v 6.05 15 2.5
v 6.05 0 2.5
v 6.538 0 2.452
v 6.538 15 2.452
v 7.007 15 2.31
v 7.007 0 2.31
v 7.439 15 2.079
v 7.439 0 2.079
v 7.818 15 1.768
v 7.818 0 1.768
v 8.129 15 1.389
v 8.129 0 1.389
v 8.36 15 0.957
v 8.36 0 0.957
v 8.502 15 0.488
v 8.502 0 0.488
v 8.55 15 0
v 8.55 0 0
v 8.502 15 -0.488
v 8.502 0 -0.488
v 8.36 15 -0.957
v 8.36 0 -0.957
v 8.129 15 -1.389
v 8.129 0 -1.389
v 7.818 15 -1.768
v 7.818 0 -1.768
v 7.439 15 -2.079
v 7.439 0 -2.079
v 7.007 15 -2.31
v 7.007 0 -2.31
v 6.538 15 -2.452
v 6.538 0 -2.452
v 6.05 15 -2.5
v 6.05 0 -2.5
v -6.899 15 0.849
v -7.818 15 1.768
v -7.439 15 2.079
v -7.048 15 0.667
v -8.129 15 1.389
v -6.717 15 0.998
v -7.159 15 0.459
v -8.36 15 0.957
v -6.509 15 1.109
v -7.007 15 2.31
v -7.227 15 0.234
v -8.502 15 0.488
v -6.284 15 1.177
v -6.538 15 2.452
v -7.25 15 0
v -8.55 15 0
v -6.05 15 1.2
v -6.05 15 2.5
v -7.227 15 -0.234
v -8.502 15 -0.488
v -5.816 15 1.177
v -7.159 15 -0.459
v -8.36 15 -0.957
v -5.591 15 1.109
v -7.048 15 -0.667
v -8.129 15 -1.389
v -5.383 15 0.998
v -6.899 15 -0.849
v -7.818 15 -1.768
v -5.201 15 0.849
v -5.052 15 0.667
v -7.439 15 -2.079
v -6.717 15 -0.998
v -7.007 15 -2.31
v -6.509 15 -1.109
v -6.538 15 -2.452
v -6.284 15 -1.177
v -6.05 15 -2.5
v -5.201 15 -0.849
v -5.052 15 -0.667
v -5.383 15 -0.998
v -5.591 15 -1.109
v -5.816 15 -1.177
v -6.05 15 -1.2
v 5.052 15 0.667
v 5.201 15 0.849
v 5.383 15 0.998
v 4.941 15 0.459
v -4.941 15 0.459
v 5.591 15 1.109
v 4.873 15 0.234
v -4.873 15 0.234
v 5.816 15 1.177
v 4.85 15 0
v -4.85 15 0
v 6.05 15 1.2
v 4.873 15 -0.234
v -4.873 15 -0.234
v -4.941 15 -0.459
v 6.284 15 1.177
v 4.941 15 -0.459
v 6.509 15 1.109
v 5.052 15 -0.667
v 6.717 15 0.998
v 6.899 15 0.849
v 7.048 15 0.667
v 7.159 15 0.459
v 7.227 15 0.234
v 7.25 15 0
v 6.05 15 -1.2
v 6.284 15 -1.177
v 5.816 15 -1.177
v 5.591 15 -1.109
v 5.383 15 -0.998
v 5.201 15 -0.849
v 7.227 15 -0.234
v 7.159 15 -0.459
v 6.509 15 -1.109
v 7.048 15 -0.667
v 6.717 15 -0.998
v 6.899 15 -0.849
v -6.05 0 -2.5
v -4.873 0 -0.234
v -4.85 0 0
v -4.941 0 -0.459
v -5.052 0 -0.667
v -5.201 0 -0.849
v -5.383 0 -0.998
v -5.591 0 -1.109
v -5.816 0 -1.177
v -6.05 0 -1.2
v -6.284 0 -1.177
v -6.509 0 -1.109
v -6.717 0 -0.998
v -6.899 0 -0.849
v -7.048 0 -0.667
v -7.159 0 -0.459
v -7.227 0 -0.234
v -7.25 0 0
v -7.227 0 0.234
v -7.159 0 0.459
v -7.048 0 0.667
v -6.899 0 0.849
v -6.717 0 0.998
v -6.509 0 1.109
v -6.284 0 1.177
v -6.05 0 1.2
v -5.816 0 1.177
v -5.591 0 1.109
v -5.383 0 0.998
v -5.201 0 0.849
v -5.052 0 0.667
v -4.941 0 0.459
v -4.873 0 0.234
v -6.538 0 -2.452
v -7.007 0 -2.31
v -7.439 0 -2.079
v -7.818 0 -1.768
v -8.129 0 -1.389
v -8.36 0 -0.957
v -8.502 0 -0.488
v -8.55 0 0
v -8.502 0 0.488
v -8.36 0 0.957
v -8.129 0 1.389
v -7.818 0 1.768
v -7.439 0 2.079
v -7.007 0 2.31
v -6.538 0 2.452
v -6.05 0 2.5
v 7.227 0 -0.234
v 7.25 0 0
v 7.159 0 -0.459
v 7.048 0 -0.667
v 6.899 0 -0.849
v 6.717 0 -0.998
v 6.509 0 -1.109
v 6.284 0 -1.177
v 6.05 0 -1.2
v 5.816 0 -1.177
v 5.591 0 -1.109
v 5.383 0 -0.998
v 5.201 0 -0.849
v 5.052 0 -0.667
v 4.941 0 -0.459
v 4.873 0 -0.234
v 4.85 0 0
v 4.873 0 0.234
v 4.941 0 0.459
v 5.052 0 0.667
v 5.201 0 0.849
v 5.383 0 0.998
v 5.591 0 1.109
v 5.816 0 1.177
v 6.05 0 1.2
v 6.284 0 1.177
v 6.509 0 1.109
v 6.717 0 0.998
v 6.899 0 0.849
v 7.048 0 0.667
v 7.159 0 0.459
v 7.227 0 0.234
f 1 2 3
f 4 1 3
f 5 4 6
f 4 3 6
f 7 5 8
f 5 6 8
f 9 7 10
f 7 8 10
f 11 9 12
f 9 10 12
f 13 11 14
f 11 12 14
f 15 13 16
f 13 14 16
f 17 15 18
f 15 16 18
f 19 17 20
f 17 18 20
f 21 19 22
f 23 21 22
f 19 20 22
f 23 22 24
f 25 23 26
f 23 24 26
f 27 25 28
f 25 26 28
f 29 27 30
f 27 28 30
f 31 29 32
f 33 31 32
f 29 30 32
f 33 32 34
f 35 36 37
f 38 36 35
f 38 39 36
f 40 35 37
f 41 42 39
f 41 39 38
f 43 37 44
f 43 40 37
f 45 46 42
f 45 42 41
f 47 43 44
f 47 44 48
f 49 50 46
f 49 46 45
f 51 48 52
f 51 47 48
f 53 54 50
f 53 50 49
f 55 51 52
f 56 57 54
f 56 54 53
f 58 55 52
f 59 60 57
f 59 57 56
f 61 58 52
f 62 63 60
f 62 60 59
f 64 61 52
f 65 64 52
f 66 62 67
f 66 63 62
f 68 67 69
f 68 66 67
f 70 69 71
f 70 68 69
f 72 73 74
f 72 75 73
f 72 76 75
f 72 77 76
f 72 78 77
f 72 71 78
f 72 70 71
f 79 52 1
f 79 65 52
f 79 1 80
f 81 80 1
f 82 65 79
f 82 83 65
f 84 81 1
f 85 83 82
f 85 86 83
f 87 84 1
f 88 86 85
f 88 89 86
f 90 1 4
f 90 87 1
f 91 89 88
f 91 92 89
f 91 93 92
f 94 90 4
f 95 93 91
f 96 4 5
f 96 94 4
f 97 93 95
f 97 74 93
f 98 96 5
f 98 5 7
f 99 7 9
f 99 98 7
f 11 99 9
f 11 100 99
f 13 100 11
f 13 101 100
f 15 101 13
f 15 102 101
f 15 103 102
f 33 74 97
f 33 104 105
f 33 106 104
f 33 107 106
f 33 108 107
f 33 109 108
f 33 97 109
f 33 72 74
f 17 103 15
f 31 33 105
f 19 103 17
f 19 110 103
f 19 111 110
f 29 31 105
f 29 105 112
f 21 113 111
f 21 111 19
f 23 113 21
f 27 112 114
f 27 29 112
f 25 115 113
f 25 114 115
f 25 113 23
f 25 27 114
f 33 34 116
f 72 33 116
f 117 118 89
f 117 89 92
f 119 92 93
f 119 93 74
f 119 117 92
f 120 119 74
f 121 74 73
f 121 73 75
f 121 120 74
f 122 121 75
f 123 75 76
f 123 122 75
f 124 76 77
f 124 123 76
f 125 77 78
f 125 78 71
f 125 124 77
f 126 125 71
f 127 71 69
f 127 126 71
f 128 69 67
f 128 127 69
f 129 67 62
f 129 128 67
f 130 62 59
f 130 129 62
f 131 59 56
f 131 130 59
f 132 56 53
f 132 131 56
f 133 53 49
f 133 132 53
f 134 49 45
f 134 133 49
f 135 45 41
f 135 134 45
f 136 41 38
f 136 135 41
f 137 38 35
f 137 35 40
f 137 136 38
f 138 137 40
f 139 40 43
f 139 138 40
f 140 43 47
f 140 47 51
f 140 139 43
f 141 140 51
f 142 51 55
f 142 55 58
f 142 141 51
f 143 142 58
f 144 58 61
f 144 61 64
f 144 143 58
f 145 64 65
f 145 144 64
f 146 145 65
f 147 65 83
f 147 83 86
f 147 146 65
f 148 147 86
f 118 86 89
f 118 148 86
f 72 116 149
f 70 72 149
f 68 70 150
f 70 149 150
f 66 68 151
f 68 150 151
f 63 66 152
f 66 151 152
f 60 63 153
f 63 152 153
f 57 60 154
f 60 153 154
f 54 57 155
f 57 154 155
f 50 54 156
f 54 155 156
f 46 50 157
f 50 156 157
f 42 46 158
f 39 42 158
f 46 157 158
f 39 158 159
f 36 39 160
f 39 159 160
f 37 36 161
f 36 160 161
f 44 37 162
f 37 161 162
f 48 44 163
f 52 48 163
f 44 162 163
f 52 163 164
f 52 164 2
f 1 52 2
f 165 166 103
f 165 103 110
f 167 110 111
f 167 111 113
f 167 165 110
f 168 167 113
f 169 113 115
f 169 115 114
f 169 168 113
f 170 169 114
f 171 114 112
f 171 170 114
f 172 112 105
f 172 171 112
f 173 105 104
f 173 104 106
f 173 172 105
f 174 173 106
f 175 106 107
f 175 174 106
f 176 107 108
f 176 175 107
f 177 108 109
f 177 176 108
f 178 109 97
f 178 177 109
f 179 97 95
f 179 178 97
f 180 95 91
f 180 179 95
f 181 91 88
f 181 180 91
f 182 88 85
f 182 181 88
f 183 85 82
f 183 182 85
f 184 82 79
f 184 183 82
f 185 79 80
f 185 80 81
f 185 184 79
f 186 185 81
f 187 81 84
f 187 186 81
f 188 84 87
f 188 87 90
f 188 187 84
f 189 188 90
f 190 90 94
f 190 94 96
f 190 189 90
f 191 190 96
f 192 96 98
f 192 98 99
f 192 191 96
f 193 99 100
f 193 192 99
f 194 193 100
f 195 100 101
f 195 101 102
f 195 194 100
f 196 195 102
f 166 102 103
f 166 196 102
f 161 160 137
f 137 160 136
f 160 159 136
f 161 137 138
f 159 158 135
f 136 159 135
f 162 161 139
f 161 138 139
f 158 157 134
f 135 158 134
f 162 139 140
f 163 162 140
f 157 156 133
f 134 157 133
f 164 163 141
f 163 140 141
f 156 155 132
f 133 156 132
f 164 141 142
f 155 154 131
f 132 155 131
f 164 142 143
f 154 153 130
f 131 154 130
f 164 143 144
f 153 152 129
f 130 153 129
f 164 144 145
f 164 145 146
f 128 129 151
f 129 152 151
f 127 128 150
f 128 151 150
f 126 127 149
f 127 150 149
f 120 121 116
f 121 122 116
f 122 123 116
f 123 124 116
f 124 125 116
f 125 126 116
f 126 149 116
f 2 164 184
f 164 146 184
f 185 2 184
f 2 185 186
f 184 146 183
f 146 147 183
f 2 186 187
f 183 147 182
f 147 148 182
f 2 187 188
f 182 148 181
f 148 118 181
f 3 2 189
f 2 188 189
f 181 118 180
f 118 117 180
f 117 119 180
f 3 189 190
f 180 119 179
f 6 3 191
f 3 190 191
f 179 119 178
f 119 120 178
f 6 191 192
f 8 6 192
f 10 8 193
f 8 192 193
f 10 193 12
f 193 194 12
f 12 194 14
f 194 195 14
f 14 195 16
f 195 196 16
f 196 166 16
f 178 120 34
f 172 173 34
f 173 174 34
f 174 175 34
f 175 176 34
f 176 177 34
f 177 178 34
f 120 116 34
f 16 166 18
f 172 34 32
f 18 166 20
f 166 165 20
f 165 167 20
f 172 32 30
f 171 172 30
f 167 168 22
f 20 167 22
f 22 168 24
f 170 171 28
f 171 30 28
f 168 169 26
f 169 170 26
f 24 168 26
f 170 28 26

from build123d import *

# Parameters (mm, degrees)
SKETCH_1_R      = 1.2
EXTRUDE_1_DEPTH = 15
SKETCH_1_3_R    = 1.2
EXTRUDE_2_DEPTH = 15


with BuildPart() as part:
    # 草图1 → 凸台-拉伸1 (new body)
    with BuildSketch(Plane(origin=(0, 0, 0), x_dir=(1, 0, 0), z_dir=(0, 1, 0))):
        with BuildLine():
            ThreePointArc((-6.05, 2.5), (-8.55, 0), (-6.05, -2.5))
            Line((-6.05, -2.5), (6.05, -2.5))
            ThreePointArc((6.05, -2.5), (8.55, 0), (6.05, 2.5))
            Line((6.05, 2.5), (-6.05, 2.5))
        make_face()
        with Locations((-6.05, 0)):
            Circle(SKETCH_1_R, mode=Mode.SUBTRACT)
        with Locations((6.05, 0)):
            Circle(SKETCH_1_R, mode=Mode.SUBTRACT)
    extrude(amount=EXTRUDE_1_DEPTH)

    # 草图1<3> → 凸台-拉伸2 (add)
    with BuildSketch(Plane(origin=(0, 0, 0), x_dir=(1, 0, 0), z_dir=(0, 1, 0))):
        with BuildLine():
            ThreePointArc((-3.55, 0), (-4.282233047, 1.767766953), (-6.05, 2.5))
            ThreePointArc((-6.05, 2.5), (-8.55, 0), (-6.05, -2.5))
            ThreePointArc((-6.05, -2.5), (-4.282233047, -1.767766953), (-3.55, 0))
        make_face()
        with Locations((-6.05, 0)):
            Circle(SKETCH_1_3_R, mode=Mode.SUBTRACT)
    extrude(amount=EXTRUDE_2_DEPTH)


solid = part.part
